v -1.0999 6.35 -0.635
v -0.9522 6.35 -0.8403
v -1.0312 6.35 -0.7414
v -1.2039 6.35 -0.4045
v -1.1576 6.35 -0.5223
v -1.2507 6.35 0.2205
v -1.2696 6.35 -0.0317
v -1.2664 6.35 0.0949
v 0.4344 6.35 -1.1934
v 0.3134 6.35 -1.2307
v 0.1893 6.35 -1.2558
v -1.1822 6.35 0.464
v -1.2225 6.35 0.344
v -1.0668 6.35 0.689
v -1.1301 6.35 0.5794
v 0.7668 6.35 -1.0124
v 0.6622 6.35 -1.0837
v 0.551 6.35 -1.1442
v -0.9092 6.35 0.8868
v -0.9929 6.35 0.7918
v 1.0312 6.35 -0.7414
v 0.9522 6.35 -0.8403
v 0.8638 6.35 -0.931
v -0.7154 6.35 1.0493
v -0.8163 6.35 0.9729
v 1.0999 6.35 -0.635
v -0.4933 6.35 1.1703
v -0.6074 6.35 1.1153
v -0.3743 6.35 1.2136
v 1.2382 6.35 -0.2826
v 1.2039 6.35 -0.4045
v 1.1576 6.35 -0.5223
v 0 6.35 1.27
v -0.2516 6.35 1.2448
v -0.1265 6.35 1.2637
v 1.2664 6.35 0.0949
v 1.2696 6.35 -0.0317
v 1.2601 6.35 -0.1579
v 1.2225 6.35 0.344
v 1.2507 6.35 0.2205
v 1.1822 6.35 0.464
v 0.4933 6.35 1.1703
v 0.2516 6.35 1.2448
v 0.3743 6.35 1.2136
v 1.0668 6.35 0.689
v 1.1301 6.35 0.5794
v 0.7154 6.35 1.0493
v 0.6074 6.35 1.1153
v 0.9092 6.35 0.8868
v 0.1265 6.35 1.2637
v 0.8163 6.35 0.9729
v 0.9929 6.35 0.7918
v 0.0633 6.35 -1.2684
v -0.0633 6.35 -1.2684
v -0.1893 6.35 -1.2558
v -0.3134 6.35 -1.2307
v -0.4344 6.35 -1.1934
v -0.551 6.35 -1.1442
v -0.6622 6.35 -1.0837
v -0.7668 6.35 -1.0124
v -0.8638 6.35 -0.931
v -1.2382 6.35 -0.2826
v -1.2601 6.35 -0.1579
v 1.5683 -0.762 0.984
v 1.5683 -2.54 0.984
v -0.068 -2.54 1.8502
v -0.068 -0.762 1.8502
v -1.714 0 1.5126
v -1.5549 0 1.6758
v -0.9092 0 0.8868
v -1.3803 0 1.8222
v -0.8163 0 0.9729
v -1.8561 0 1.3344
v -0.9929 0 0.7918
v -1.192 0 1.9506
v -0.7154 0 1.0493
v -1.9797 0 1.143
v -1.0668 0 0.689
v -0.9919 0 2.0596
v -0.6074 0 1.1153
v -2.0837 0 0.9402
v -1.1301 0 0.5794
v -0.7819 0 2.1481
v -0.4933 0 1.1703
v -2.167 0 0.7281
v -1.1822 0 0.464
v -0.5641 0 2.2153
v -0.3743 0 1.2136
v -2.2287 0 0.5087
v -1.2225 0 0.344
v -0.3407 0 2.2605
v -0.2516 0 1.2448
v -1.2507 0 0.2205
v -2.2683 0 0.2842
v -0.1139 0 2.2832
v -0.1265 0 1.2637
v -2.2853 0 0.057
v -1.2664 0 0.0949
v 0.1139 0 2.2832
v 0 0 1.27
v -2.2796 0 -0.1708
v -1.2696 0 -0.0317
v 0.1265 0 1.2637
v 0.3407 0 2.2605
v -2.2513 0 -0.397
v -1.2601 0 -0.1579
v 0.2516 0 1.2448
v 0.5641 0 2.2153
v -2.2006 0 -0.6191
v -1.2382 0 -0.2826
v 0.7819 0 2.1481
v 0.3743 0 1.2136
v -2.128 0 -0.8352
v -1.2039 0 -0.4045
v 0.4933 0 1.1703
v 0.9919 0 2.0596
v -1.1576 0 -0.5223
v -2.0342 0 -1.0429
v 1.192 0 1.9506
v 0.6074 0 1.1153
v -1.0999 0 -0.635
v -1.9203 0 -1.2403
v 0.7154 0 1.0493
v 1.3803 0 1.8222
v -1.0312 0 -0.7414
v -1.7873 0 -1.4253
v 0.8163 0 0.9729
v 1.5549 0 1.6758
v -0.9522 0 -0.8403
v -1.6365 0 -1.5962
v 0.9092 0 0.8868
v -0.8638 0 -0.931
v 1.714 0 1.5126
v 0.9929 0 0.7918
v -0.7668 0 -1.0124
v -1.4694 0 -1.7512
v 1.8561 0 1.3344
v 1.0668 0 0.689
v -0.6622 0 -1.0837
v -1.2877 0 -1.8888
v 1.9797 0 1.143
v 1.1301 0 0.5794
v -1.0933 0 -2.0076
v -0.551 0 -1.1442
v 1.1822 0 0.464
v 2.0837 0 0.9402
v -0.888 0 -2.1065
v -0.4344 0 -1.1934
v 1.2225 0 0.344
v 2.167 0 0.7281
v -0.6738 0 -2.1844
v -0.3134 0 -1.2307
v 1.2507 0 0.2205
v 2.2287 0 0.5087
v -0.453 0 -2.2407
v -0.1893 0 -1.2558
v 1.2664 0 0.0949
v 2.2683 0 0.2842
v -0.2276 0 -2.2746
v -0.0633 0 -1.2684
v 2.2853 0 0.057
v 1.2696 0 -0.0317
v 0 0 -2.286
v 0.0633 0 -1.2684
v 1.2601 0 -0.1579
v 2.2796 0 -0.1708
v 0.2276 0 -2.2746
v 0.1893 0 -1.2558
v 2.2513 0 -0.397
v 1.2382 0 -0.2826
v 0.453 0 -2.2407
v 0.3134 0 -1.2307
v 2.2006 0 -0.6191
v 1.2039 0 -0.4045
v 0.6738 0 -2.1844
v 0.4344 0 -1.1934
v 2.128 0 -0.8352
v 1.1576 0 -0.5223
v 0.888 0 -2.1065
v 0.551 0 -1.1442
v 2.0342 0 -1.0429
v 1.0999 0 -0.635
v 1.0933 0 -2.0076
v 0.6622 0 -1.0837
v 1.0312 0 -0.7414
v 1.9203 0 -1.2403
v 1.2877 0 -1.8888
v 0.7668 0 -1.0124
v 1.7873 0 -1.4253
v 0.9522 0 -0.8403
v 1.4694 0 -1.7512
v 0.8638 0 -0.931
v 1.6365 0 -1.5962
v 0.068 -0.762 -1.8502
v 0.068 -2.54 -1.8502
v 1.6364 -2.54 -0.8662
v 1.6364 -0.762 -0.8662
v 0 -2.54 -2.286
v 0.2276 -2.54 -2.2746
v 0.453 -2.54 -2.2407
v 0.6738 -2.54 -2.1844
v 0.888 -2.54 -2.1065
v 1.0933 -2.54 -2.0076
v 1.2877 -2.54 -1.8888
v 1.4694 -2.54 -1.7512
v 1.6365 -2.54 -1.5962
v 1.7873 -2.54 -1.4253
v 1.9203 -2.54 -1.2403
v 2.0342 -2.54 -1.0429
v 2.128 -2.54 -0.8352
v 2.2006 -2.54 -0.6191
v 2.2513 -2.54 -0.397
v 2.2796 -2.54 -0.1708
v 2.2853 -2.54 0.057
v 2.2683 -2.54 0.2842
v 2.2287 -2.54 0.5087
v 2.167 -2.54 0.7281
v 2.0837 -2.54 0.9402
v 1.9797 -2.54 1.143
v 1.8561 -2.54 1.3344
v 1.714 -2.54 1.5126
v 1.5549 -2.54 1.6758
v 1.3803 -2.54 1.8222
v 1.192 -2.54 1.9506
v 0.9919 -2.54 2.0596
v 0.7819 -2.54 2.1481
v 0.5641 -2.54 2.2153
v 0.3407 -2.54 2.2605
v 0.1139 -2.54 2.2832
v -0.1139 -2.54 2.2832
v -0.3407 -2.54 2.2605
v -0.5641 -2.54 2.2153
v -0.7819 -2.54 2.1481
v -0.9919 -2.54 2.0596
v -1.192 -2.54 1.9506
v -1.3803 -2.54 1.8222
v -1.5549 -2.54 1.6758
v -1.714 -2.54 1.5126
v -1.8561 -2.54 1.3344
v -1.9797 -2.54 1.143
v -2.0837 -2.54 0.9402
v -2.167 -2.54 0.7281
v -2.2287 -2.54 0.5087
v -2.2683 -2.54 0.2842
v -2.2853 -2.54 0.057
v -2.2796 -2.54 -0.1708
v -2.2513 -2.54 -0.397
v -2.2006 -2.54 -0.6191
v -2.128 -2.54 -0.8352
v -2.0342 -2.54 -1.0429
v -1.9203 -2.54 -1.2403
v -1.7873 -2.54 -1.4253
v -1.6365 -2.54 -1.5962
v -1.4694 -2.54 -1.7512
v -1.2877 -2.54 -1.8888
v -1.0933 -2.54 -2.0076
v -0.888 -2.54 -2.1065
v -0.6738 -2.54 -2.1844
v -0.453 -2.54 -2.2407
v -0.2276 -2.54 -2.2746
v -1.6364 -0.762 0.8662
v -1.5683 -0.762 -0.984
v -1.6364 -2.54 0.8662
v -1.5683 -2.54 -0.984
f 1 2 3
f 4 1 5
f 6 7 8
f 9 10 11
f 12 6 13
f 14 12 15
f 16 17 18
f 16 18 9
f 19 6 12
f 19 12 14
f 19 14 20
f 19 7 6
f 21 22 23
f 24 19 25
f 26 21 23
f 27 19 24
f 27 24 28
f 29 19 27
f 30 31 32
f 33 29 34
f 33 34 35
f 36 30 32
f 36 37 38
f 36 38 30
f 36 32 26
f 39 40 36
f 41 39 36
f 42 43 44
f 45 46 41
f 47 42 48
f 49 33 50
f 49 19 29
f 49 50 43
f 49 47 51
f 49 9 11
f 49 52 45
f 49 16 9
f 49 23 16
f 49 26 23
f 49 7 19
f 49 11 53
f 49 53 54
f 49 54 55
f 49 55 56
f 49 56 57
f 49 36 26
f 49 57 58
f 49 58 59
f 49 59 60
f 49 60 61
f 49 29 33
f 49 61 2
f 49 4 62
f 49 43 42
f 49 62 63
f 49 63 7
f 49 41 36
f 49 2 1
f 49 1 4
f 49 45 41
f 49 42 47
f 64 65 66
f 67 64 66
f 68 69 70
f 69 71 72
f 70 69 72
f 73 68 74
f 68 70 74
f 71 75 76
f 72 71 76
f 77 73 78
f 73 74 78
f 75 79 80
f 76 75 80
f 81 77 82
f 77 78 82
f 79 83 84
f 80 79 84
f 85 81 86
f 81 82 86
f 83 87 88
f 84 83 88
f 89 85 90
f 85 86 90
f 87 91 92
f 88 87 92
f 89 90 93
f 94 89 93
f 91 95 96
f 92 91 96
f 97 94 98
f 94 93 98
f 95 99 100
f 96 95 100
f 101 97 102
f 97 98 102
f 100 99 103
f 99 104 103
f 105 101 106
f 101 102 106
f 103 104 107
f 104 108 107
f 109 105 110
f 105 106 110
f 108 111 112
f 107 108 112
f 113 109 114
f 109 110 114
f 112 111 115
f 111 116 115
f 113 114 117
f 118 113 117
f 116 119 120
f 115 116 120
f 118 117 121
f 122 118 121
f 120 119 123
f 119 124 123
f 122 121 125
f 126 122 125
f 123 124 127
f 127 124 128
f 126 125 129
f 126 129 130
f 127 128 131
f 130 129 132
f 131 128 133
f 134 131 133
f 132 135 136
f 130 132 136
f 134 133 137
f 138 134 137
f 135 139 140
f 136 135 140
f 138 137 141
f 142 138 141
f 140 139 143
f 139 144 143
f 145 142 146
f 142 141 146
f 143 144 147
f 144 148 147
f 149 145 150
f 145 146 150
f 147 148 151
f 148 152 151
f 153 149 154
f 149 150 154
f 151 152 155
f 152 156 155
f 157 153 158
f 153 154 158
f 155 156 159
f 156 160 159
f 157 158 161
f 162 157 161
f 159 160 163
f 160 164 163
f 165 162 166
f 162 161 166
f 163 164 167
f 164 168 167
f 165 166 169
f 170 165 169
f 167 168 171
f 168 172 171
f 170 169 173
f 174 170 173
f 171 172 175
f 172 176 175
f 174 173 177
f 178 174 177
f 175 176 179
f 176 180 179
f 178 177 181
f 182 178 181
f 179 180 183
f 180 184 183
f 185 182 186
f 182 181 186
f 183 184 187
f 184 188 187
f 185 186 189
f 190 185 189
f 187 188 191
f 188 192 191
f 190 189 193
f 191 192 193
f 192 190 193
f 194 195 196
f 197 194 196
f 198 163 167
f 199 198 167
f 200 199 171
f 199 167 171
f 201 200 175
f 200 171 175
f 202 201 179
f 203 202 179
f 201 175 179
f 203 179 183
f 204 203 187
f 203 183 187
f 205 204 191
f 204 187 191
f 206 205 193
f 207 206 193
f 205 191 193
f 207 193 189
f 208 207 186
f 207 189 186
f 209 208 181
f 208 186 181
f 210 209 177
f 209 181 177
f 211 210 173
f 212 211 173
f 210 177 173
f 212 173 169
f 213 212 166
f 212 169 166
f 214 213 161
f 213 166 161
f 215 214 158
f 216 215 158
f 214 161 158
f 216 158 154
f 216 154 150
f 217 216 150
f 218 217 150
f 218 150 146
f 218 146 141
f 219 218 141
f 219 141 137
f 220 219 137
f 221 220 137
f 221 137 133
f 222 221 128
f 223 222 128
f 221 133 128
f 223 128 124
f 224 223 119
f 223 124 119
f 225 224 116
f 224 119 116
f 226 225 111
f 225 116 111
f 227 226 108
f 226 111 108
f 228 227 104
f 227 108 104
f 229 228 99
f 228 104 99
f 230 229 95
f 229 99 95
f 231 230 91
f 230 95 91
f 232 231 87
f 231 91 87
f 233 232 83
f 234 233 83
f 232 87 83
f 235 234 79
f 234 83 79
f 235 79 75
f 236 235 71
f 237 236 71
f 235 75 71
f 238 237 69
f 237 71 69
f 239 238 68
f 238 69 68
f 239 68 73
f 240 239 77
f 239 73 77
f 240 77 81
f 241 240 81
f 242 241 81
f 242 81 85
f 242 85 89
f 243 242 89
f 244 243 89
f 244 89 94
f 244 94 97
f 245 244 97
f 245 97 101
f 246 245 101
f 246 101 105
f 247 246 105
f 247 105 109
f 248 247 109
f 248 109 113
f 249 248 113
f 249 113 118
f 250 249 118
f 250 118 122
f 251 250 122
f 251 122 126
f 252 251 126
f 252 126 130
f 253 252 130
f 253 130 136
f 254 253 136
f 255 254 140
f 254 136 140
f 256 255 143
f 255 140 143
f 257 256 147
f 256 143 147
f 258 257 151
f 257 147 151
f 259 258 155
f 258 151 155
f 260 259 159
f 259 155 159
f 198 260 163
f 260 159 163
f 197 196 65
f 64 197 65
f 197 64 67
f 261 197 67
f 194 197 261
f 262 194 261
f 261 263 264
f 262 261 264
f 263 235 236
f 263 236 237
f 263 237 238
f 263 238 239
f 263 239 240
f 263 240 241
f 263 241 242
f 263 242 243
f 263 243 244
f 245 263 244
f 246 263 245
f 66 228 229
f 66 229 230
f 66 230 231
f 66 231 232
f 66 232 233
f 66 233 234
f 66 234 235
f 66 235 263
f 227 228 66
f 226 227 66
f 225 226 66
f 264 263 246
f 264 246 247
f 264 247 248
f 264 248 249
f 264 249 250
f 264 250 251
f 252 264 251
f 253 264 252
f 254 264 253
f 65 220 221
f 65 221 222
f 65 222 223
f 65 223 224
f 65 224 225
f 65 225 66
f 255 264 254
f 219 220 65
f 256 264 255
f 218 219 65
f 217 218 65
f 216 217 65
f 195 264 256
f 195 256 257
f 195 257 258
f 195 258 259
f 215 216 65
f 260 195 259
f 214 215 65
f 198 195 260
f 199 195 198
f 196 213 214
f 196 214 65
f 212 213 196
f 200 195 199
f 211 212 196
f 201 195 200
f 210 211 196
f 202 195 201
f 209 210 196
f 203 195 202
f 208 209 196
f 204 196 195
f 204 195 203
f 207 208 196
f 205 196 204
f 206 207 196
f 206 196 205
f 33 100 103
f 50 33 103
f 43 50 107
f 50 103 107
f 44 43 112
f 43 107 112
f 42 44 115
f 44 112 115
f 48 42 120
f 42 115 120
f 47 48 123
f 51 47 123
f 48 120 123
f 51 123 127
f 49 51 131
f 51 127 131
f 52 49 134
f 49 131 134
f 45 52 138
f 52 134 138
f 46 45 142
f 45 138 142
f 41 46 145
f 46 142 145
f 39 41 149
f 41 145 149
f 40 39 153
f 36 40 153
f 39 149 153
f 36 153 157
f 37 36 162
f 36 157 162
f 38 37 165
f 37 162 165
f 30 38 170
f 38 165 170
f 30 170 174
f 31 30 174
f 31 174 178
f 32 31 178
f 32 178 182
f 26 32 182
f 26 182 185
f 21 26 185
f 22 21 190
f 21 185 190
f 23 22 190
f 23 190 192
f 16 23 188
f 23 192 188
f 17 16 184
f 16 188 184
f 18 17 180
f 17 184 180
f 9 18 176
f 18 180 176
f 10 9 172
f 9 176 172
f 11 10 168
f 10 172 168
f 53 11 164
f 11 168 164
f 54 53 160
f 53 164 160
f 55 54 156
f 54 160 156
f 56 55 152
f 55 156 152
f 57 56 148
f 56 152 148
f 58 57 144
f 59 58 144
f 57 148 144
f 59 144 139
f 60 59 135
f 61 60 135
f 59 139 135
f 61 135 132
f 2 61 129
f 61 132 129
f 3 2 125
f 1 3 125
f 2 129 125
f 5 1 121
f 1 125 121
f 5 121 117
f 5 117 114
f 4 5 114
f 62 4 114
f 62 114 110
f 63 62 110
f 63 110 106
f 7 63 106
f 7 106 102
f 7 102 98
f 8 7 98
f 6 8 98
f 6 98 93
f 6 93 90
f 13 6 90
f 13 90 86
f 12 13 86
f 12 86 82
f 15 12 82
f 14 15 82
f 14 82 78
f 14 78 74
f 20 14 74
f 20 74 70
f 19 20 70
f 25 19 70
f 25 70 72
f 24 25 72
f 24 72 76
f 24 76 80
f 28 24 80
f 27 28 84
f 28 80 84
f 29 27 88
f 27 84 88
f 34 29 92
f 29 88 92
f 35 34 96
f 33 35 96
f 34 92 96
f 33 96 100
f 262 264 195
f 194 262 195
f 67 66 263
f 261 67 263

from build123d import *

# Parameters (mm, degrees)
SKETCH1_R           = 1.27
BOSS_EXTRUDE1_DEPTH = 6.35
SKETCH2_R           = 2.286
BOSS_EXTRUDE2_DEPTH = 2.54
CUT_EXTRUDE1_DEPTH  = 1.778


with BuildPart() as part:
    # Sketch1 → Boss-Extrude1 (new body)
    with BuildSketch(Plane(origin=(0, 0, 0), x_dir=(1, 0, 0), z_dir=(0, 1, 0))):
        with Locations(Location((0, 0, 0), (0, 0, 270))):
            Circle(SKETCH1_R)
    extrude(amount=BOSS_EXTRUDE1_DEPTH)

    # Sketch2 → Boss-Extrude2 (add)
    with BuildSketch(Plane.XZ):
        with Locations(Location((0, 0, 0), (0, 0, 270))):
            Circle(SKETCH2_R)
    extrude(amount=BOSS_EXTRUDE2_DEPTH)

    # Sketch3 → Cut-Extrude1 (cut)
    with BuildSketch(Plane(origin=(0, -2.54, 0), x_dir=(-1, 0, 0), z_dir=(0, -1, 0))):
        Polygon((-0.068044734, 1.850241436), (-1.636378453, 0.86619225), (-1.56833372, -0.984049186), (0.068044734, -1.850241436), (1.636378453, -0.86619225), (1.56833372, 0.984049186), align=None)
    extrude(amount=-CUT_EXTRUDE1_DEPTH, mode=Mode.SUBTRACT)


solid = part.part
